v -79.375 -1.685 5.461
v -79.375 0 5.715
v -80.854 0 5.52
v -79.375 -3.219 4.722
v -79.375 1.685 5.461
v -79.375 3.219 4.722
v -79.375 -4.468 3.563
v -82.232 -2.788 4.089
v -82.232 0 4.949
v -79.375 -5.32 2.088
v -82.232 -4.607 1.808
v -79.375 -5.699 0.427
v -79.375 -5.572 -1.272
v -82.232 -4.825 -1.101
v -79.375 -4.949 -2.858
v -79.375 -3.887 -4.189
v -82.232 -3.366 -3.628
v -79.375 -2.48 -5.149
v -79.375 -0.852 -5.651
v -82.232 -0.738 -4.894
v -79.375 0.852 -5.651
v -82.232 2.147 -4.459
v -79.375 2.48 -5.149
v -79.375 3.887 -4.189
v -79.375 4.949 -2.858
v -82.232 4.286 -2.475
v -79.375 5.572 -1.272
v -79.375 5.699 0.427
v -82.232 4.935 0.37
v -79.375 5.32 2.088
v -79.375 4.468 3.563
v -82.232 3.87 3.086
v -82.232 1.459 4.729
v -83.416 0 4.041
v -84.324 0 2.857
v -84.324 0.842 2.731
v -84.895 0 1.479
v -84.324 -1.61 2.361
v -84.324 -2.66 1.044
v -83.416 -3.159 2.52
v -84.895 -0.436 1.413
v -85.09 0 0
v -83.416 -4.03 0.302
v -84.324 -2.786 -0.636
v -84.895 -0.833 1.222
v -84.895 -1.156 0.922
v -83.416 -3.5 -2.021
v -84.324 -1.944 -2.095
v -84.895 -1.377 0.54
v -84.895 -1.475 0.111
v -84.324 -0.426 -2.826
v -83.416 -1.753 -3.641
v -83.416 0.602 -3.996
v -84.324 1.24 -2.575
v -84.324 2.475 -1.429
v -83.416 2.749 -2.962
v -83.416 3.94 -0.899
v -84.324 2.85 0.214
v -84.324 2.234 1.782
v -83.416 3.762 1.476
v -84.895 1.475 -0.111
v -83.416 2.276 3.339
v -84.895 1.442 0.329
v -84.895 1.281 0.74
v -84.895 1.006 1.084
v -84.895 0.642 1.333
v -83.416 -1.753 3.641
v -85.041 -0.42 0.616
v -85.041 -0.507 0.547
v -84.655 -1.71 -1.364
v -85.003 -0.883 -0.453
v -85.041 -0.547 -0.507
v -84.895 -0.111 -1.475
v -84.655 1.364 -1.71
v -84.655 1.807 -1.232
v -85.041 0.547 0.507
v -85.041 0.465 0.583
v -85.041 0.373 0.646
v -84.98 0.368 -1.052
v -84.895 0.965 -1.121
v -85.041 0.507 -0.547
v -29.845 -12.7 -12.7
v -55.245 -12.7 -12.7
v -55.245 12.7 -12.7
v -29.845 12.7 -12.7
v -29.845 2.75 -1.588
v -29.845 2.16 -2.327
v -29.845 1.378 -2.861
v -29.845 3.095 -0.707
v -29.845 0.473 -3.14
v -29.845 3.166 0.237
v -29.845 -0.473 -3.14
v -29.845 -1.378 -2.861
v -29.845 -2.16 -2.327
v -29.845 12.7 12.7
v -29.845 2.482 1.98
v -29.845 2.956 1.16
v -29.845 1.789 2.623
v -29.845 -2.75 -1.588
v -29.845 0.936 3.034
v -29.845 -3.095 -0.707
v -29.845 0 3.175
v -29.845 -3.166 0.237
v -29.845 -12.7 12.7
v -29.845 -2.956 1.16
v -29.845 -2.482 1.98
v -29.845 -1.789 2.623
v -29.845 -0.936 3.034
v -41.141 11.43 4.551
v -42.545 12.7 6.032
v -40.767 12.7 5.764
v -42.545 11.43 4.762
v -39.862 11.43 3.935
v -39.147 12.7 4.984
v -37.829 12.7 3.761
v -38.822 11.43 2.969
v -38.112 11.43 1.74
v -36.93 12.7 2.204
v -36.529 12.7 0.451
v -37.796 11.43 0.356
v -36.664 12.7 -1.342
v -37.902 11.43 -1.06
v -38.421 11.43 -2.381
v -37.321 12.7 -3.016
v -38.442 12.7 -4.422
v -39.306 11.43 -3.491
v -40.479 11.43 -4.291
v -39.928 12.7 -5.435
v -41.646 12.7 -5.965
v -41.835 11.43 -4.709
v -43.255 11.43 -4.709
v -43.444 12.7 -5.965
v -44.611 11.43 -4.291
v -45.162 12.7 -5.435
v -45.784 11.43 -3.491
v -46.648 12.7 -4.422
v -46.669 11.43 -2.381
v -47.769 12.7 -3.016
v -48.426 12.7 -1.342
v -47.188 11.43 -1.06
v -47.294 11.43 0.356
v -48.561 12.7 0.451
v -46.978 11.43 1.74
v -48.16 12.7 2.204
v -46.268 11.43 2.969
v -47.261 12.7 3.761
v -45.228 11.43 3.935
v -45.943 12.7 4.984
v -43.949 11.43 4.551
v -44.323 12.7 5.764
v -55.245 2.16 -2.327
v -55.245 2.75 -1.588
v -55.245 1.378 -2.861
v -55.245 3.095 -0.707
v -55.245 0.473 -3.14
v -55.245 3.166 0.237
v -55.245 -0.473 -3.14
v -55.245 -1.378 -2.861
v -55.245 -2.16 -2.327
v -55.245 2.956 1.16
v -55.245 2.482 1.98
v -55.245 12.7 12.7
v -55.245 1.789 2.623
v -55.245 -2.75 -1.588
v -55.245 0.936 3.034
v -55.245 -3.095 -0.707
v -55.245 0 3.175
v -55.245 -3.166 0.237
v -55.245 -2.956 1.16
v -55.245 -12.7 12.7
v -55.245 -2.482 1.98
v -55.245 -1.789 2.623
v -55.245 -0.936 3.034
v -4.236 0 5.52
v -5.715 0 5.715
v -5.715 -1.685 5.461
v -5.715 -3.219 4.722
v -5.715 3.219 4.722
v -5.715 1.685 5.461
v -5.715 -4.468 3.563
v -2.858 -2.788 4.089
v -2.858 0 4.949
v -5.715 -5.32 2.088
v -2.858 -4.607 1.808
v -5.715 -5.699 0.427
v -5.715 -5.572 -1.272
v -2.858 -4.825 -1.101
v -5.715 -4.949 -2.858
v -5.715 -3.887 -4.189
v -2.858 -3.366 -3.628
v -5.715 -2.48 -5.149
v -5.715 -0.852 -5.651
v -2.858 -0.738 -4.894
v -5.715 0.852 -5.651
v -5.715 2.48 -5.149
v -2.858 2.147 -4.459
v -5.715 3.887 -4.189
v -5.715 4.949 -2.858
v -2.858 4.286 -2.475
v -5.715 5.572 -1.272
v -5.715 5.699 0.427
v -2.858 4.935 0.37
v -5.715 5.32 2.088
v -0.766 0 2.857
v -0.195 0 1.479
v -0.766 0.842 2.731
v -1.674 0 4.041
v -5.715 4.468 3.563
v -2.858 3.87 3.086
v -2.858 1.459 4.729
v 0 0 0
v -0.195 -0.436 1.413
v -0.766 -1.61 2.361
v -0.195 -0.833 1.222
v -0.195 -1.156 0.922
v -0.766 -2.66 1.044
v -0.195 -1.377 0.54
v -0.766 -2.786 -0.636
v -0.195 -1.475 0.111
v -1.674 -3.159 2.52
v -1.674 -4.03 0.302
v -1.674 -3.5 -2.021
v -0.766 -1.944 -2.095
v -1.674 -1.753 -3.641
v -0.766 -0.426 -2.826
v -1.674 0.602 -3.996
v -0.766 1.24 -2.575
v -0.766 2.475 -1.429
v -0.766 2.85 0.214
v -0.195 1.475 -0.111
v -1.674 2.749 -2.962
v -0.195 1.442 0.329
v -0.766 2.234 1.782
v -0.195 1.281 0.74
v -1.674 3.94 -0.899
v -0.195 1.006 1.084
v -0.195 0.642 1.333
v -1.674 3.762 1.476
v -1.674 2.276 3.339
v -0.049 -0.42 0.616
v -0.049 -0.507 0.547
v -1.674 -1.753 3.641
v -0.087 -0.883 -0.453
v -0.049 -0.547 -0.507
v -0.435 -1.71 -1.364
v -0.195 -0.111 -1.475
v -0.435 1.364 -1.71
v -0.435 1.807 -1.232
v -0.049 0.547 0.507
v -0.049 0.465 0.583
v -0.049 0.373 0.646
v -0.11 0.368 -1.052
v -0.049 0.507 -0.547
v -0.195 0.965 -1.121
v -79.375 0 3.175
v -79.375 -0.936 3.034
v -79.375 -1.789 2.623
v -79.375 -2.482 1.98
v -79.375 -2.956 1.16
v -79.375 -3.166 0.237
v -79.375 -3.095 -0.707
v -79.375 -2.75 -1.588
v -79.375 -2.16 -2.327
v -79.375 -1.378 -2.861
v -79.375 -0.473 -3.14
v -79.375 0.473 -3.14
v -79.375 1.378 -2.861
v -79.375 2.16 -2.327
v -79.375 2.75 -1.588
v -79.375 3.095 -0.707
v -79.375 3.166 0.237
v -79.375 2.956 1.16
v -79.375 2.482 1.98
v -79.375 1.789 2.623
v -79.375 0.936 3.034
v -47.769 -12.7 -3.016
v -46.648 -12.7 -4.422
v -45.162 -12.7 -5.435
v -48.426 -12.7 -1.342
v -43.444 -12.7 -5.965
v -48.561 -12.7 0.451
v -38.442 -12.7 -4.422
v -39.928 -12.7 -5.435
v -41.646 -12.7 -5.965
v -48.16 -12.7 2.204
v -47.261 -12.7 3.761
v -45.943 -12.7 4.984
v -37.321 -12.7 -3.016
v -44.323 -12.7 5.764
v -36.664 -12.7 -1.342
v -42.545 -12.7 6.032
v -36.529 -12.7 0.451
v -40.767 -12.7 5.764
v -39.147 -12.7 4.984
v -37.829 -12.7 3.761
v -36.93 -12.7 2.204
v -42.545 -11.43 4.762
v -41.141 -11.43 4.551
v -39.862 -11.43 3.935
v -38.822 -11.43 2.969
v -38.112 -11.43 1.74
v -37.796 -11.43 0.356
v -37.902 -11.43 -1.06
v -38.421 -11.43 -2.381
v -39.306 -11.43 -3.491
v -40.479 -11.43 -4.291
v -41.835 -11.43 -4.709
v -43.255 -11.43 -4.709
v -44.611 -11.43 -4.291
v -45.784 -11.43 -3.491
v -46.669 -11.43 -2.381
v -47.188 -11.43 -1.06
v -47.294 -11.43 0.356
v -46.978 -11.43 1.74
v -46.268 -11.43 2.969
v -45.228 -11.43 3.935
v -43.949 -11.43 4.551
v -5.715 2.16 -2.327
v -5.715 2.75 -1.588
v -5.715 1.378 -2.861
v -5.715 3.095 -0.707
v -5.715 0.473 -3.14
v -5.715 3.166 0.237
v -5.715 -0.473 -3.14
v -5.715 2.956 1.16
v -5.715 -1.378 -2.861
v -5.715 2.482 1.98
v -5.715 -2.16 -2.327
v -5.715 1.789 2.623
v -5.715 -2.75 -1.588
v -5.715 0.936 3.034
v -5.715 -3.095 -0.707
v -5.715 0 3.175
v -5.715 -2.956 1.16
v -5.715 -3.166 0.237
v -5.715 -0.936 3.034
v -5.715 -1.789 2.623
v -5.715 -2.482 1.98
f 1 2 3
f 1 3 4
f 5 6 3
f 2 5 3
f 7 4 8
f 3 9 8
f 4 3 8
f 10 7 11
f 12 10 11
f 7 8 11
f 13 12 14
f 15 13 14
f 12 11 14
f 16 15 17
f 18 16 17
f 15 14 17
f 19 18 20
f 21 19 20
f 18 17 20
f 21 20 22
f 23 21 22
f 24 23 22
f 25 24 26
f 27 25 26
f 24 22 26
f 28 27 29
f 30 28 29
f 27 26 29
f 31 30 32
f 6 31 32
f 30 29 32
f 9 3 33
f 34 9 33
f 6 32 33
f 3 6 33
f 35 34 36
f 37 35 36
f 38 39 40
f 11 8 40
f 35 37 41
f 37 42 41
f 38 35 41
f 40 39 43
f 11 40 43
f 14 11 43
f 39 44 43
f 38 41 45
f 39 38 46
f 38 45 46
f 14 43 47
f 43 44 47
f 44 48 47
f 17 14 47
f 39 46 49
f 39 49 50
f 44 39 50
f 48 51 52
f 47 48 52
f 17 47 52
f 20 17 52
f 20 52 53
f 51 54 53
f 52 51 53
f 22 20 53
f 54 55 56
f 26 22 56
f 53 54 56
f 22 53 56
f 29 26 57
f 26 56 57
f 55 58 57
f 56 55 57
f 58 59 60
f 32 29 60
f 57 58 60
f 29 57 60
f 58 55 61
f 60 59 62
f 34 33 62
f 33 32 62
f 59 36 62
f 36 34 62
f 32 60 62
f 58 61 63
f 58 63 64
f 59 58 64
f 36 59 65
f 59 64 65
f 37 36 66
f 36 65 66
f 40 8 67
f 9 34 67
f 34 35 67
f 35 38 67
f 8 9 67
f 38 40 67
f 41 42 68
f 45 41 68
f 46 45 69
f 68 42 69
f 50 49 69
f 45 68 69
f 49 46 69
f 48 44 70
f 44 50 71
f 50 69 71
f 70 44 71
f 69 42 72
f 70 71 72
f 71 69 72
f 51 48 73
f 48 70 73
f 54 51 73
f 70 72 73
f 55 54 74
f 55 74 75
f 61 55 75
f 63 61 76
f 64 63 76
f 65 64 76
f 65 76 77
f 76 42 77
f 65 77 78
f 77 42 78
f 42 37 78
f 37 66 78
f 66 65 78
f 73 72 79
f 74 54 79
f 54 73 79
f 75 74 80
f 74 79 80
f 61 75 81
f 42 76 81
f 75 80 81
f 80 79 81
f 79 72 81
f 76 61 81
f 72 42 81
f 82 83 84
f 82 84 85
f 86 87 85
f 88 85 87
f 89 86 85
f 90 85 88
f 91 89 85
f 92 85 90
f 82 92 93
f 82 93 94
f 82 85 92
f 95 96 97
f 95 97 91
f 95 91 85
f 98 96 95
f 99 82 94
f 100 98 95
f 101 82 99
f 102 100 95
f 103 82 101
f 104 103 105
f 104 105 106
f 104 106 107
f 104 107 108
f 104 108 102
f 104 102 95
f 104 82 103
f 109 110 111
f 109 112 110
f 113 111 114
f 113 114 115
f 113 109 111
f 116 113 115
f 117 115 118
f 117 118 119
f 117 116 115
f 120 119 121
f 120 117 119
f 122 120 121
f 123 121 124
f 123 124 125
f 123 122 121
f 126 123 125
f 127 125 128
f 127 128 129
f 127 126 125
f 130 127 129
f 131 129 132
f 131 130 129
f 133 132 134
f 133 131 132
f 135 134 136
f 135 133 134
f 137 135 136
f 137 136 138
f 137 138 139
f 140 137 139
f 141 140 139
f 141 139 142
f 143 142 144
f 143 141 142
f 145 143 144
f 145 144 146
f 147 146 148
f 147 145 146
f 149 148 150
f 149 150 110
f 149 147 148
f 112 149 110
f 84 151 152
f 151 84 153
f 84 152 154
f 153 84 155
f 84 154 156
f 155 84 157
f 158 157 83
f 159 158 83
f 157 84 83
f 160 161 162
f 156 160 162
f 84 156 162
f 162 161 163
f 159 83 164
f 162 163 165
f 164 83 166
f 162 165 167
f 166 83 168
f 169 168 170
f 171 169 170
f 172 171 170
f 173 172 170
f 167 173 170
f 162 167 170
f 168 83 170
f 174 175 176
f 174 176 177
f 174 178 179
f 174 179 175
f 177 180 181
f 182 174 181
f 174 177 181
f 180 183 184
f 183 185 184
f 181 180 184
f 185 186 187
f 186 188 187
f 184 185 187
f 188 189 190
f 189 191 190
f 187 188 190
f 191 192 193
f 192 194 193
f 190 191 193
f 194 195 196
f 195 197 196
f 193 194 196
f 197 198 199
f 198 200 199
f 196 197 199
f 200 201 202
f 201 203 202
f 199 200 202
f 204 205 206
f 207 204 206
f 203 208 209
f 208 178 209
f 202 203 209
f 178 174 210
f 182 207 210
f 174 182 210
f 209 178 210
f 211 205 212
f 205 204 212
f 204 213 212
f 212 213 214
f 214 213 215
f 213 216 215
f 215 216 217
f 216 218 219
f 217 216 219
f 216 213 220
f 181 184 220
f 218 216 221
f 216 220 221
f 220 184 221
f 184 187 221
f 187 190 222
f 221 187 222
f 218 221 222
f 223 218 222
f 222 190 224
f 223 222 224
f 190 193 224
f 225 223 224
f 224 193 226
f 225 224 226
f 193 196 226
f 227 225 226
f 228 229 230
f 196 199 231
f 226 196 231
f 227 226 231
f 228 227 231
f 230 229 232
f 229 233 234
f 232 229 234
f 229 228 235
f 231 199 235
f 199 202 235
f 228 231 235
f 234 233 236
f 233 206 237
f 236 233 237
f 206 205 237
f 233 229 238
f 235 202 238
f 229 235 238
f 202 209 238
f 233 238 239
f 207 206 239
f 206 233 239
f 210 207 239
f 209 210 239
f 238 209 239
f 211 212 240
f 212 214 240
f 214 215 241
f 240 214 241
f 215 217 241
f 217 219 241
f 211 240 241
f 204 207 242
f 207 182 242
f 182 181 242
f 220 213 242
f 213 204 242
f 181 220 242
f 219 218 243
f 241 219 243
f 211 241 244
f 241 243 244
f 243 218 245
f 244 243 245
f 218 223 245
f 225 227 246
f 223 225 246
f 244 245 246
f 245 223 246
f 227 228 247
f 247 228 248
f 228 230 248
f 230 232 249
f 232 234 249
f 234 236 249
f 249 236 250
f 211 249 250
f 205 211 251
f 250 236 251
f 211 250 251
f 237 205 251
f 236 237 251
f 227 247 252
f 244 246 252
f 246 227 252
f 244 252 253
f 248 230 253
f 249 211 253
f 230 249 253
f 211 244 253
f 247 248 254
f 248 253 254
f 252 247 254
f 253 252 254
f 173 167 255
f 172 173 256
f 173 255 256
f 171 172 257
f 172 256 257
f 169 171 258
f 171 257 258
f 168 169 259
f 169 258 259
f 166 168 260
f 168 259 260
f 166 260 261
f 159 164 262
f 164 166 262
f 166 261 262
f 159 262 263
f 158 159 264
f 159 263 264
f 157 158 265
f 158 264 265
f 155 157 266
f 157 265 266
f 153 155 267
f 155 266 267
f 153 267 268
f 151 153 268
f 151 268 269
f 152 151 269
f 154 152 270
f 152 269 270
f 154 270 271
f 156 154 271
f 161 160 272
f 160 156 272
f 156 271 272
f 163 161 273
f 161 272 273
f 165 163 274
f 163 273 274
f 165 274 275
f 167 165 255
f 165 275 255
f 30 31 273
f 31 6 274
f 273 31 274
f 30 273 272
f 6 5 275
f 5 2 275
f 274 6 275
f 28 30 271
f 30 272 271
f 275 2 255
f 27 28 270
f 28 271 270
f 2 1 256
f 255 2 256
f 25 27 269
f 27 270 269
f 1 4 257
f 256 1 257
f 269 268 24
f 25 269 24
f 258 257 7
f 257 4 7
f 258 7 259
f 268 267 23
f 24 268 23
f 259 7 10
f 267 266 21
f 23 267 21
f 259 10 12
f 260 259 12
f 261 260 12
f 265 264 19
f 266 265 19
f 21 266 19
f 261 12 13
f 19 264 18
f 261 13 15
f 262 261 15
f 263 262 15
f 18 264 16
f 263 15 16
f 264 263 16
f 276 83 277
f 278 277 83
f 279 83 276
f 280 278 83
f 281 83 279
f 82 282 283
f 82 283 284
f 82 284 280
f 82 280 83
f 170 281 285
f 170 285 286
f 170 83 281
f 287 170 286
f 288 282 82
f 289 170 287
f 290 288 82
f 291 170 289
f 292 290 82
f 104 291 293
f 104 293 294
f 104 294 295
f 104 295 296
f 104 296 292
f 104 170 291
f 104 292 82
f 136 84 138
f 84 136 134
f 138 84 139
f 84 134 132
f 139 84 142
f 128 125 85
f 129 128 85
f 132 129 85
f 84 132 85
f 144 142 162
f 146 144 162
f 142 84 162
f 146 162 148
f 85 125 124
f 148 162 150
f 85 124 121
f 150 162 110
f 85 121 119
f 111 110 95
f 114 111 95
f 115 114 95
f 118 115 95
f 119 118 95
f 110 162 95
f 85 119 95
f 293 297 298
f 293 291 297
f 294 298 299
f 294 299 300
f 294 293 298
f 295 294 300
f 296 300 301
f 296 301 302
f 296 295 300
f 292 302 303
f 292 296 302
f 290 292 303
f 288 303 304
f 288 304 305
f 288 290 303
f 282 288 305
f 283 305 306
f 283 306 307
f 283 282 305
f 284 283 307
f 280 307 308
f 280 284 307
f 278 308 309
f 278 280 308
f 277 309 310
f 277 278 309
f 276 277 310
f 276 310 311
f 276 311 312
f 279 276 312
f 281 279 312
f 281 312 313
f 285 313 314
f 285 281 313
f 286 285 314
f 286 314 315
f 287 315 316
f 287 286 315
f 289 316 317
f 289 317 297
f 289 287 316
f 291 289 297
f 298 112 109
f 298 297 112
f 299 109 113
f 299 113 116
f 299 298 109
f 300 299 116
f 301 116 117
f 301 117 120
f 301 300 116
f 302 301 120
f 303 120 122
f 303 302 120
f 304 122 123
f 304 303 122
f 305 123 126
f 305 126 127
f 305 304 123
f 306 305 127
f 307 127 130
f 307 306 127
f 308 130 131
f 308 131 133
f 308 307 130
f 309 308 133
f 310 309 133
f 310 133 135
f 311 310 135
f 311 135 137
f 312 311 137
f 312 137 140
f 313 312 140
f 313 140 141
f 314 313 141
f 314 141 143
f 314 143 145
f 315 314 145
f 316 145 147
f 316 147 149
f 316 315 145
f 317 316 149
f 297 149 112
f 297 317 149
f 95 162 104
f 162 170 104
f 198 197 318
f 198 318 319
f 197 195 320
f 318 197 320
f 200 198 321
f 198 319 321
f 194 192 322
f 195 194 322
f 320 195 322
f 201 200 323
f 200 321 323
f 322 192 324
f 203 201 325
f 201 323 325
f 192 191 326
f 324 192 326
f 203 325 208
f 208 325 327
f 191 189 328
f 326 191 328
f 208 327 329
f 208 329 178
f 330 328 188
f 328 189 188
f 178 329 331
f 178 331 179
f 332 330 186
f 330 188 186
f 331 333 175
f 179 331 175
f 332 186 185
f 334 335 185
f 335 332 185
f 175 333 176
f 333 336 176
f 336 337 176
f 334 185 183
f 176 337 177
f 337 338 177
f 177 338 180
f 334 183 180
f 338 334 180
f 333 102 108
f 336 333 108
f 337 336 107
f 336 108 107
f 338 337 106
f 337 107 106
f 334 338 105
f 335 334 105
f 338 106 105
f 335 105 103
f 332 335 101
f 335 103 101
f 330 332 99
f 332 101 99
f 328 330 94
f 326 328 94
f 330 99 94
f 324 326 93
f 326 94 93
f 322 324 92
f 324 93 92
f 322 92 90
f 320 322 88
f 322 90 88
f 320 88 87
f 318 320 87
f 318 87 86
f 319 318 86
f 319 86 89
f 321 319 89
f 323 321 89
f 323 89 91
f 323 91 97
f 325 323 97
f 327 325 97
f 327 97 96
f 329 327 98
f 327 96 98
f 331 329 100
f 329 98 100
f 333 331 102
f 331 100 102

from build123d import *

# Parameters (mm, degrees)
F2_W     = 25.4
F2_H     = 25.4
F3_DEPTH = 12.7


with BuildPart() as f1:
    # F0 (on Front) → F1 (revolve)
    with BuildSketch(Plane.XZ):
        with BuildLine():
            Line((-79.375, 3.175), (-79.375, 5.715))
            ThreePointArc((-79.375, 5.715), (-83.416115, 4.041115), (-85.09, 0))
            Line((-85.09, 0), (0, 0))
            ThreePointArc((0, 0), (-1.673885, 4.041115), (-5.715, 5.715))
            Line((-5.715, 5.715), (-5.715, 3.175))
            Line((-5.715, 3.175), (-79.375, 3.175))
        make_face()
    revolve(axis=Axis((8.346166, 0, 0), (1, 0, 0)))

    # F2 (on Front) → F3 (join, symmetric)
    with BuildSketch(Plane.XZ):
        with Locations((-42.545, 0)):
            Rectangle(F2_W, F2_H)
    extrude(amount=F3_DEPTH, both=True)

    # F5 (on plane+point) → F6 (revolve, cut)
    with BuildSketch(Plane.YZ.offset(-42.545)):
        Polygon((-12.7, 6.0325), (-12.7, 0), (12.7, 0), (12.7, 6.0325), (11.43, 4.7625), (-11.43, 4.7625), align=None)
    revolve(axis=Axis((-42.545, 22.809027, 0), (0, 1, 0)), mode=Mode.SUBTRACT)


solid = f1.part
